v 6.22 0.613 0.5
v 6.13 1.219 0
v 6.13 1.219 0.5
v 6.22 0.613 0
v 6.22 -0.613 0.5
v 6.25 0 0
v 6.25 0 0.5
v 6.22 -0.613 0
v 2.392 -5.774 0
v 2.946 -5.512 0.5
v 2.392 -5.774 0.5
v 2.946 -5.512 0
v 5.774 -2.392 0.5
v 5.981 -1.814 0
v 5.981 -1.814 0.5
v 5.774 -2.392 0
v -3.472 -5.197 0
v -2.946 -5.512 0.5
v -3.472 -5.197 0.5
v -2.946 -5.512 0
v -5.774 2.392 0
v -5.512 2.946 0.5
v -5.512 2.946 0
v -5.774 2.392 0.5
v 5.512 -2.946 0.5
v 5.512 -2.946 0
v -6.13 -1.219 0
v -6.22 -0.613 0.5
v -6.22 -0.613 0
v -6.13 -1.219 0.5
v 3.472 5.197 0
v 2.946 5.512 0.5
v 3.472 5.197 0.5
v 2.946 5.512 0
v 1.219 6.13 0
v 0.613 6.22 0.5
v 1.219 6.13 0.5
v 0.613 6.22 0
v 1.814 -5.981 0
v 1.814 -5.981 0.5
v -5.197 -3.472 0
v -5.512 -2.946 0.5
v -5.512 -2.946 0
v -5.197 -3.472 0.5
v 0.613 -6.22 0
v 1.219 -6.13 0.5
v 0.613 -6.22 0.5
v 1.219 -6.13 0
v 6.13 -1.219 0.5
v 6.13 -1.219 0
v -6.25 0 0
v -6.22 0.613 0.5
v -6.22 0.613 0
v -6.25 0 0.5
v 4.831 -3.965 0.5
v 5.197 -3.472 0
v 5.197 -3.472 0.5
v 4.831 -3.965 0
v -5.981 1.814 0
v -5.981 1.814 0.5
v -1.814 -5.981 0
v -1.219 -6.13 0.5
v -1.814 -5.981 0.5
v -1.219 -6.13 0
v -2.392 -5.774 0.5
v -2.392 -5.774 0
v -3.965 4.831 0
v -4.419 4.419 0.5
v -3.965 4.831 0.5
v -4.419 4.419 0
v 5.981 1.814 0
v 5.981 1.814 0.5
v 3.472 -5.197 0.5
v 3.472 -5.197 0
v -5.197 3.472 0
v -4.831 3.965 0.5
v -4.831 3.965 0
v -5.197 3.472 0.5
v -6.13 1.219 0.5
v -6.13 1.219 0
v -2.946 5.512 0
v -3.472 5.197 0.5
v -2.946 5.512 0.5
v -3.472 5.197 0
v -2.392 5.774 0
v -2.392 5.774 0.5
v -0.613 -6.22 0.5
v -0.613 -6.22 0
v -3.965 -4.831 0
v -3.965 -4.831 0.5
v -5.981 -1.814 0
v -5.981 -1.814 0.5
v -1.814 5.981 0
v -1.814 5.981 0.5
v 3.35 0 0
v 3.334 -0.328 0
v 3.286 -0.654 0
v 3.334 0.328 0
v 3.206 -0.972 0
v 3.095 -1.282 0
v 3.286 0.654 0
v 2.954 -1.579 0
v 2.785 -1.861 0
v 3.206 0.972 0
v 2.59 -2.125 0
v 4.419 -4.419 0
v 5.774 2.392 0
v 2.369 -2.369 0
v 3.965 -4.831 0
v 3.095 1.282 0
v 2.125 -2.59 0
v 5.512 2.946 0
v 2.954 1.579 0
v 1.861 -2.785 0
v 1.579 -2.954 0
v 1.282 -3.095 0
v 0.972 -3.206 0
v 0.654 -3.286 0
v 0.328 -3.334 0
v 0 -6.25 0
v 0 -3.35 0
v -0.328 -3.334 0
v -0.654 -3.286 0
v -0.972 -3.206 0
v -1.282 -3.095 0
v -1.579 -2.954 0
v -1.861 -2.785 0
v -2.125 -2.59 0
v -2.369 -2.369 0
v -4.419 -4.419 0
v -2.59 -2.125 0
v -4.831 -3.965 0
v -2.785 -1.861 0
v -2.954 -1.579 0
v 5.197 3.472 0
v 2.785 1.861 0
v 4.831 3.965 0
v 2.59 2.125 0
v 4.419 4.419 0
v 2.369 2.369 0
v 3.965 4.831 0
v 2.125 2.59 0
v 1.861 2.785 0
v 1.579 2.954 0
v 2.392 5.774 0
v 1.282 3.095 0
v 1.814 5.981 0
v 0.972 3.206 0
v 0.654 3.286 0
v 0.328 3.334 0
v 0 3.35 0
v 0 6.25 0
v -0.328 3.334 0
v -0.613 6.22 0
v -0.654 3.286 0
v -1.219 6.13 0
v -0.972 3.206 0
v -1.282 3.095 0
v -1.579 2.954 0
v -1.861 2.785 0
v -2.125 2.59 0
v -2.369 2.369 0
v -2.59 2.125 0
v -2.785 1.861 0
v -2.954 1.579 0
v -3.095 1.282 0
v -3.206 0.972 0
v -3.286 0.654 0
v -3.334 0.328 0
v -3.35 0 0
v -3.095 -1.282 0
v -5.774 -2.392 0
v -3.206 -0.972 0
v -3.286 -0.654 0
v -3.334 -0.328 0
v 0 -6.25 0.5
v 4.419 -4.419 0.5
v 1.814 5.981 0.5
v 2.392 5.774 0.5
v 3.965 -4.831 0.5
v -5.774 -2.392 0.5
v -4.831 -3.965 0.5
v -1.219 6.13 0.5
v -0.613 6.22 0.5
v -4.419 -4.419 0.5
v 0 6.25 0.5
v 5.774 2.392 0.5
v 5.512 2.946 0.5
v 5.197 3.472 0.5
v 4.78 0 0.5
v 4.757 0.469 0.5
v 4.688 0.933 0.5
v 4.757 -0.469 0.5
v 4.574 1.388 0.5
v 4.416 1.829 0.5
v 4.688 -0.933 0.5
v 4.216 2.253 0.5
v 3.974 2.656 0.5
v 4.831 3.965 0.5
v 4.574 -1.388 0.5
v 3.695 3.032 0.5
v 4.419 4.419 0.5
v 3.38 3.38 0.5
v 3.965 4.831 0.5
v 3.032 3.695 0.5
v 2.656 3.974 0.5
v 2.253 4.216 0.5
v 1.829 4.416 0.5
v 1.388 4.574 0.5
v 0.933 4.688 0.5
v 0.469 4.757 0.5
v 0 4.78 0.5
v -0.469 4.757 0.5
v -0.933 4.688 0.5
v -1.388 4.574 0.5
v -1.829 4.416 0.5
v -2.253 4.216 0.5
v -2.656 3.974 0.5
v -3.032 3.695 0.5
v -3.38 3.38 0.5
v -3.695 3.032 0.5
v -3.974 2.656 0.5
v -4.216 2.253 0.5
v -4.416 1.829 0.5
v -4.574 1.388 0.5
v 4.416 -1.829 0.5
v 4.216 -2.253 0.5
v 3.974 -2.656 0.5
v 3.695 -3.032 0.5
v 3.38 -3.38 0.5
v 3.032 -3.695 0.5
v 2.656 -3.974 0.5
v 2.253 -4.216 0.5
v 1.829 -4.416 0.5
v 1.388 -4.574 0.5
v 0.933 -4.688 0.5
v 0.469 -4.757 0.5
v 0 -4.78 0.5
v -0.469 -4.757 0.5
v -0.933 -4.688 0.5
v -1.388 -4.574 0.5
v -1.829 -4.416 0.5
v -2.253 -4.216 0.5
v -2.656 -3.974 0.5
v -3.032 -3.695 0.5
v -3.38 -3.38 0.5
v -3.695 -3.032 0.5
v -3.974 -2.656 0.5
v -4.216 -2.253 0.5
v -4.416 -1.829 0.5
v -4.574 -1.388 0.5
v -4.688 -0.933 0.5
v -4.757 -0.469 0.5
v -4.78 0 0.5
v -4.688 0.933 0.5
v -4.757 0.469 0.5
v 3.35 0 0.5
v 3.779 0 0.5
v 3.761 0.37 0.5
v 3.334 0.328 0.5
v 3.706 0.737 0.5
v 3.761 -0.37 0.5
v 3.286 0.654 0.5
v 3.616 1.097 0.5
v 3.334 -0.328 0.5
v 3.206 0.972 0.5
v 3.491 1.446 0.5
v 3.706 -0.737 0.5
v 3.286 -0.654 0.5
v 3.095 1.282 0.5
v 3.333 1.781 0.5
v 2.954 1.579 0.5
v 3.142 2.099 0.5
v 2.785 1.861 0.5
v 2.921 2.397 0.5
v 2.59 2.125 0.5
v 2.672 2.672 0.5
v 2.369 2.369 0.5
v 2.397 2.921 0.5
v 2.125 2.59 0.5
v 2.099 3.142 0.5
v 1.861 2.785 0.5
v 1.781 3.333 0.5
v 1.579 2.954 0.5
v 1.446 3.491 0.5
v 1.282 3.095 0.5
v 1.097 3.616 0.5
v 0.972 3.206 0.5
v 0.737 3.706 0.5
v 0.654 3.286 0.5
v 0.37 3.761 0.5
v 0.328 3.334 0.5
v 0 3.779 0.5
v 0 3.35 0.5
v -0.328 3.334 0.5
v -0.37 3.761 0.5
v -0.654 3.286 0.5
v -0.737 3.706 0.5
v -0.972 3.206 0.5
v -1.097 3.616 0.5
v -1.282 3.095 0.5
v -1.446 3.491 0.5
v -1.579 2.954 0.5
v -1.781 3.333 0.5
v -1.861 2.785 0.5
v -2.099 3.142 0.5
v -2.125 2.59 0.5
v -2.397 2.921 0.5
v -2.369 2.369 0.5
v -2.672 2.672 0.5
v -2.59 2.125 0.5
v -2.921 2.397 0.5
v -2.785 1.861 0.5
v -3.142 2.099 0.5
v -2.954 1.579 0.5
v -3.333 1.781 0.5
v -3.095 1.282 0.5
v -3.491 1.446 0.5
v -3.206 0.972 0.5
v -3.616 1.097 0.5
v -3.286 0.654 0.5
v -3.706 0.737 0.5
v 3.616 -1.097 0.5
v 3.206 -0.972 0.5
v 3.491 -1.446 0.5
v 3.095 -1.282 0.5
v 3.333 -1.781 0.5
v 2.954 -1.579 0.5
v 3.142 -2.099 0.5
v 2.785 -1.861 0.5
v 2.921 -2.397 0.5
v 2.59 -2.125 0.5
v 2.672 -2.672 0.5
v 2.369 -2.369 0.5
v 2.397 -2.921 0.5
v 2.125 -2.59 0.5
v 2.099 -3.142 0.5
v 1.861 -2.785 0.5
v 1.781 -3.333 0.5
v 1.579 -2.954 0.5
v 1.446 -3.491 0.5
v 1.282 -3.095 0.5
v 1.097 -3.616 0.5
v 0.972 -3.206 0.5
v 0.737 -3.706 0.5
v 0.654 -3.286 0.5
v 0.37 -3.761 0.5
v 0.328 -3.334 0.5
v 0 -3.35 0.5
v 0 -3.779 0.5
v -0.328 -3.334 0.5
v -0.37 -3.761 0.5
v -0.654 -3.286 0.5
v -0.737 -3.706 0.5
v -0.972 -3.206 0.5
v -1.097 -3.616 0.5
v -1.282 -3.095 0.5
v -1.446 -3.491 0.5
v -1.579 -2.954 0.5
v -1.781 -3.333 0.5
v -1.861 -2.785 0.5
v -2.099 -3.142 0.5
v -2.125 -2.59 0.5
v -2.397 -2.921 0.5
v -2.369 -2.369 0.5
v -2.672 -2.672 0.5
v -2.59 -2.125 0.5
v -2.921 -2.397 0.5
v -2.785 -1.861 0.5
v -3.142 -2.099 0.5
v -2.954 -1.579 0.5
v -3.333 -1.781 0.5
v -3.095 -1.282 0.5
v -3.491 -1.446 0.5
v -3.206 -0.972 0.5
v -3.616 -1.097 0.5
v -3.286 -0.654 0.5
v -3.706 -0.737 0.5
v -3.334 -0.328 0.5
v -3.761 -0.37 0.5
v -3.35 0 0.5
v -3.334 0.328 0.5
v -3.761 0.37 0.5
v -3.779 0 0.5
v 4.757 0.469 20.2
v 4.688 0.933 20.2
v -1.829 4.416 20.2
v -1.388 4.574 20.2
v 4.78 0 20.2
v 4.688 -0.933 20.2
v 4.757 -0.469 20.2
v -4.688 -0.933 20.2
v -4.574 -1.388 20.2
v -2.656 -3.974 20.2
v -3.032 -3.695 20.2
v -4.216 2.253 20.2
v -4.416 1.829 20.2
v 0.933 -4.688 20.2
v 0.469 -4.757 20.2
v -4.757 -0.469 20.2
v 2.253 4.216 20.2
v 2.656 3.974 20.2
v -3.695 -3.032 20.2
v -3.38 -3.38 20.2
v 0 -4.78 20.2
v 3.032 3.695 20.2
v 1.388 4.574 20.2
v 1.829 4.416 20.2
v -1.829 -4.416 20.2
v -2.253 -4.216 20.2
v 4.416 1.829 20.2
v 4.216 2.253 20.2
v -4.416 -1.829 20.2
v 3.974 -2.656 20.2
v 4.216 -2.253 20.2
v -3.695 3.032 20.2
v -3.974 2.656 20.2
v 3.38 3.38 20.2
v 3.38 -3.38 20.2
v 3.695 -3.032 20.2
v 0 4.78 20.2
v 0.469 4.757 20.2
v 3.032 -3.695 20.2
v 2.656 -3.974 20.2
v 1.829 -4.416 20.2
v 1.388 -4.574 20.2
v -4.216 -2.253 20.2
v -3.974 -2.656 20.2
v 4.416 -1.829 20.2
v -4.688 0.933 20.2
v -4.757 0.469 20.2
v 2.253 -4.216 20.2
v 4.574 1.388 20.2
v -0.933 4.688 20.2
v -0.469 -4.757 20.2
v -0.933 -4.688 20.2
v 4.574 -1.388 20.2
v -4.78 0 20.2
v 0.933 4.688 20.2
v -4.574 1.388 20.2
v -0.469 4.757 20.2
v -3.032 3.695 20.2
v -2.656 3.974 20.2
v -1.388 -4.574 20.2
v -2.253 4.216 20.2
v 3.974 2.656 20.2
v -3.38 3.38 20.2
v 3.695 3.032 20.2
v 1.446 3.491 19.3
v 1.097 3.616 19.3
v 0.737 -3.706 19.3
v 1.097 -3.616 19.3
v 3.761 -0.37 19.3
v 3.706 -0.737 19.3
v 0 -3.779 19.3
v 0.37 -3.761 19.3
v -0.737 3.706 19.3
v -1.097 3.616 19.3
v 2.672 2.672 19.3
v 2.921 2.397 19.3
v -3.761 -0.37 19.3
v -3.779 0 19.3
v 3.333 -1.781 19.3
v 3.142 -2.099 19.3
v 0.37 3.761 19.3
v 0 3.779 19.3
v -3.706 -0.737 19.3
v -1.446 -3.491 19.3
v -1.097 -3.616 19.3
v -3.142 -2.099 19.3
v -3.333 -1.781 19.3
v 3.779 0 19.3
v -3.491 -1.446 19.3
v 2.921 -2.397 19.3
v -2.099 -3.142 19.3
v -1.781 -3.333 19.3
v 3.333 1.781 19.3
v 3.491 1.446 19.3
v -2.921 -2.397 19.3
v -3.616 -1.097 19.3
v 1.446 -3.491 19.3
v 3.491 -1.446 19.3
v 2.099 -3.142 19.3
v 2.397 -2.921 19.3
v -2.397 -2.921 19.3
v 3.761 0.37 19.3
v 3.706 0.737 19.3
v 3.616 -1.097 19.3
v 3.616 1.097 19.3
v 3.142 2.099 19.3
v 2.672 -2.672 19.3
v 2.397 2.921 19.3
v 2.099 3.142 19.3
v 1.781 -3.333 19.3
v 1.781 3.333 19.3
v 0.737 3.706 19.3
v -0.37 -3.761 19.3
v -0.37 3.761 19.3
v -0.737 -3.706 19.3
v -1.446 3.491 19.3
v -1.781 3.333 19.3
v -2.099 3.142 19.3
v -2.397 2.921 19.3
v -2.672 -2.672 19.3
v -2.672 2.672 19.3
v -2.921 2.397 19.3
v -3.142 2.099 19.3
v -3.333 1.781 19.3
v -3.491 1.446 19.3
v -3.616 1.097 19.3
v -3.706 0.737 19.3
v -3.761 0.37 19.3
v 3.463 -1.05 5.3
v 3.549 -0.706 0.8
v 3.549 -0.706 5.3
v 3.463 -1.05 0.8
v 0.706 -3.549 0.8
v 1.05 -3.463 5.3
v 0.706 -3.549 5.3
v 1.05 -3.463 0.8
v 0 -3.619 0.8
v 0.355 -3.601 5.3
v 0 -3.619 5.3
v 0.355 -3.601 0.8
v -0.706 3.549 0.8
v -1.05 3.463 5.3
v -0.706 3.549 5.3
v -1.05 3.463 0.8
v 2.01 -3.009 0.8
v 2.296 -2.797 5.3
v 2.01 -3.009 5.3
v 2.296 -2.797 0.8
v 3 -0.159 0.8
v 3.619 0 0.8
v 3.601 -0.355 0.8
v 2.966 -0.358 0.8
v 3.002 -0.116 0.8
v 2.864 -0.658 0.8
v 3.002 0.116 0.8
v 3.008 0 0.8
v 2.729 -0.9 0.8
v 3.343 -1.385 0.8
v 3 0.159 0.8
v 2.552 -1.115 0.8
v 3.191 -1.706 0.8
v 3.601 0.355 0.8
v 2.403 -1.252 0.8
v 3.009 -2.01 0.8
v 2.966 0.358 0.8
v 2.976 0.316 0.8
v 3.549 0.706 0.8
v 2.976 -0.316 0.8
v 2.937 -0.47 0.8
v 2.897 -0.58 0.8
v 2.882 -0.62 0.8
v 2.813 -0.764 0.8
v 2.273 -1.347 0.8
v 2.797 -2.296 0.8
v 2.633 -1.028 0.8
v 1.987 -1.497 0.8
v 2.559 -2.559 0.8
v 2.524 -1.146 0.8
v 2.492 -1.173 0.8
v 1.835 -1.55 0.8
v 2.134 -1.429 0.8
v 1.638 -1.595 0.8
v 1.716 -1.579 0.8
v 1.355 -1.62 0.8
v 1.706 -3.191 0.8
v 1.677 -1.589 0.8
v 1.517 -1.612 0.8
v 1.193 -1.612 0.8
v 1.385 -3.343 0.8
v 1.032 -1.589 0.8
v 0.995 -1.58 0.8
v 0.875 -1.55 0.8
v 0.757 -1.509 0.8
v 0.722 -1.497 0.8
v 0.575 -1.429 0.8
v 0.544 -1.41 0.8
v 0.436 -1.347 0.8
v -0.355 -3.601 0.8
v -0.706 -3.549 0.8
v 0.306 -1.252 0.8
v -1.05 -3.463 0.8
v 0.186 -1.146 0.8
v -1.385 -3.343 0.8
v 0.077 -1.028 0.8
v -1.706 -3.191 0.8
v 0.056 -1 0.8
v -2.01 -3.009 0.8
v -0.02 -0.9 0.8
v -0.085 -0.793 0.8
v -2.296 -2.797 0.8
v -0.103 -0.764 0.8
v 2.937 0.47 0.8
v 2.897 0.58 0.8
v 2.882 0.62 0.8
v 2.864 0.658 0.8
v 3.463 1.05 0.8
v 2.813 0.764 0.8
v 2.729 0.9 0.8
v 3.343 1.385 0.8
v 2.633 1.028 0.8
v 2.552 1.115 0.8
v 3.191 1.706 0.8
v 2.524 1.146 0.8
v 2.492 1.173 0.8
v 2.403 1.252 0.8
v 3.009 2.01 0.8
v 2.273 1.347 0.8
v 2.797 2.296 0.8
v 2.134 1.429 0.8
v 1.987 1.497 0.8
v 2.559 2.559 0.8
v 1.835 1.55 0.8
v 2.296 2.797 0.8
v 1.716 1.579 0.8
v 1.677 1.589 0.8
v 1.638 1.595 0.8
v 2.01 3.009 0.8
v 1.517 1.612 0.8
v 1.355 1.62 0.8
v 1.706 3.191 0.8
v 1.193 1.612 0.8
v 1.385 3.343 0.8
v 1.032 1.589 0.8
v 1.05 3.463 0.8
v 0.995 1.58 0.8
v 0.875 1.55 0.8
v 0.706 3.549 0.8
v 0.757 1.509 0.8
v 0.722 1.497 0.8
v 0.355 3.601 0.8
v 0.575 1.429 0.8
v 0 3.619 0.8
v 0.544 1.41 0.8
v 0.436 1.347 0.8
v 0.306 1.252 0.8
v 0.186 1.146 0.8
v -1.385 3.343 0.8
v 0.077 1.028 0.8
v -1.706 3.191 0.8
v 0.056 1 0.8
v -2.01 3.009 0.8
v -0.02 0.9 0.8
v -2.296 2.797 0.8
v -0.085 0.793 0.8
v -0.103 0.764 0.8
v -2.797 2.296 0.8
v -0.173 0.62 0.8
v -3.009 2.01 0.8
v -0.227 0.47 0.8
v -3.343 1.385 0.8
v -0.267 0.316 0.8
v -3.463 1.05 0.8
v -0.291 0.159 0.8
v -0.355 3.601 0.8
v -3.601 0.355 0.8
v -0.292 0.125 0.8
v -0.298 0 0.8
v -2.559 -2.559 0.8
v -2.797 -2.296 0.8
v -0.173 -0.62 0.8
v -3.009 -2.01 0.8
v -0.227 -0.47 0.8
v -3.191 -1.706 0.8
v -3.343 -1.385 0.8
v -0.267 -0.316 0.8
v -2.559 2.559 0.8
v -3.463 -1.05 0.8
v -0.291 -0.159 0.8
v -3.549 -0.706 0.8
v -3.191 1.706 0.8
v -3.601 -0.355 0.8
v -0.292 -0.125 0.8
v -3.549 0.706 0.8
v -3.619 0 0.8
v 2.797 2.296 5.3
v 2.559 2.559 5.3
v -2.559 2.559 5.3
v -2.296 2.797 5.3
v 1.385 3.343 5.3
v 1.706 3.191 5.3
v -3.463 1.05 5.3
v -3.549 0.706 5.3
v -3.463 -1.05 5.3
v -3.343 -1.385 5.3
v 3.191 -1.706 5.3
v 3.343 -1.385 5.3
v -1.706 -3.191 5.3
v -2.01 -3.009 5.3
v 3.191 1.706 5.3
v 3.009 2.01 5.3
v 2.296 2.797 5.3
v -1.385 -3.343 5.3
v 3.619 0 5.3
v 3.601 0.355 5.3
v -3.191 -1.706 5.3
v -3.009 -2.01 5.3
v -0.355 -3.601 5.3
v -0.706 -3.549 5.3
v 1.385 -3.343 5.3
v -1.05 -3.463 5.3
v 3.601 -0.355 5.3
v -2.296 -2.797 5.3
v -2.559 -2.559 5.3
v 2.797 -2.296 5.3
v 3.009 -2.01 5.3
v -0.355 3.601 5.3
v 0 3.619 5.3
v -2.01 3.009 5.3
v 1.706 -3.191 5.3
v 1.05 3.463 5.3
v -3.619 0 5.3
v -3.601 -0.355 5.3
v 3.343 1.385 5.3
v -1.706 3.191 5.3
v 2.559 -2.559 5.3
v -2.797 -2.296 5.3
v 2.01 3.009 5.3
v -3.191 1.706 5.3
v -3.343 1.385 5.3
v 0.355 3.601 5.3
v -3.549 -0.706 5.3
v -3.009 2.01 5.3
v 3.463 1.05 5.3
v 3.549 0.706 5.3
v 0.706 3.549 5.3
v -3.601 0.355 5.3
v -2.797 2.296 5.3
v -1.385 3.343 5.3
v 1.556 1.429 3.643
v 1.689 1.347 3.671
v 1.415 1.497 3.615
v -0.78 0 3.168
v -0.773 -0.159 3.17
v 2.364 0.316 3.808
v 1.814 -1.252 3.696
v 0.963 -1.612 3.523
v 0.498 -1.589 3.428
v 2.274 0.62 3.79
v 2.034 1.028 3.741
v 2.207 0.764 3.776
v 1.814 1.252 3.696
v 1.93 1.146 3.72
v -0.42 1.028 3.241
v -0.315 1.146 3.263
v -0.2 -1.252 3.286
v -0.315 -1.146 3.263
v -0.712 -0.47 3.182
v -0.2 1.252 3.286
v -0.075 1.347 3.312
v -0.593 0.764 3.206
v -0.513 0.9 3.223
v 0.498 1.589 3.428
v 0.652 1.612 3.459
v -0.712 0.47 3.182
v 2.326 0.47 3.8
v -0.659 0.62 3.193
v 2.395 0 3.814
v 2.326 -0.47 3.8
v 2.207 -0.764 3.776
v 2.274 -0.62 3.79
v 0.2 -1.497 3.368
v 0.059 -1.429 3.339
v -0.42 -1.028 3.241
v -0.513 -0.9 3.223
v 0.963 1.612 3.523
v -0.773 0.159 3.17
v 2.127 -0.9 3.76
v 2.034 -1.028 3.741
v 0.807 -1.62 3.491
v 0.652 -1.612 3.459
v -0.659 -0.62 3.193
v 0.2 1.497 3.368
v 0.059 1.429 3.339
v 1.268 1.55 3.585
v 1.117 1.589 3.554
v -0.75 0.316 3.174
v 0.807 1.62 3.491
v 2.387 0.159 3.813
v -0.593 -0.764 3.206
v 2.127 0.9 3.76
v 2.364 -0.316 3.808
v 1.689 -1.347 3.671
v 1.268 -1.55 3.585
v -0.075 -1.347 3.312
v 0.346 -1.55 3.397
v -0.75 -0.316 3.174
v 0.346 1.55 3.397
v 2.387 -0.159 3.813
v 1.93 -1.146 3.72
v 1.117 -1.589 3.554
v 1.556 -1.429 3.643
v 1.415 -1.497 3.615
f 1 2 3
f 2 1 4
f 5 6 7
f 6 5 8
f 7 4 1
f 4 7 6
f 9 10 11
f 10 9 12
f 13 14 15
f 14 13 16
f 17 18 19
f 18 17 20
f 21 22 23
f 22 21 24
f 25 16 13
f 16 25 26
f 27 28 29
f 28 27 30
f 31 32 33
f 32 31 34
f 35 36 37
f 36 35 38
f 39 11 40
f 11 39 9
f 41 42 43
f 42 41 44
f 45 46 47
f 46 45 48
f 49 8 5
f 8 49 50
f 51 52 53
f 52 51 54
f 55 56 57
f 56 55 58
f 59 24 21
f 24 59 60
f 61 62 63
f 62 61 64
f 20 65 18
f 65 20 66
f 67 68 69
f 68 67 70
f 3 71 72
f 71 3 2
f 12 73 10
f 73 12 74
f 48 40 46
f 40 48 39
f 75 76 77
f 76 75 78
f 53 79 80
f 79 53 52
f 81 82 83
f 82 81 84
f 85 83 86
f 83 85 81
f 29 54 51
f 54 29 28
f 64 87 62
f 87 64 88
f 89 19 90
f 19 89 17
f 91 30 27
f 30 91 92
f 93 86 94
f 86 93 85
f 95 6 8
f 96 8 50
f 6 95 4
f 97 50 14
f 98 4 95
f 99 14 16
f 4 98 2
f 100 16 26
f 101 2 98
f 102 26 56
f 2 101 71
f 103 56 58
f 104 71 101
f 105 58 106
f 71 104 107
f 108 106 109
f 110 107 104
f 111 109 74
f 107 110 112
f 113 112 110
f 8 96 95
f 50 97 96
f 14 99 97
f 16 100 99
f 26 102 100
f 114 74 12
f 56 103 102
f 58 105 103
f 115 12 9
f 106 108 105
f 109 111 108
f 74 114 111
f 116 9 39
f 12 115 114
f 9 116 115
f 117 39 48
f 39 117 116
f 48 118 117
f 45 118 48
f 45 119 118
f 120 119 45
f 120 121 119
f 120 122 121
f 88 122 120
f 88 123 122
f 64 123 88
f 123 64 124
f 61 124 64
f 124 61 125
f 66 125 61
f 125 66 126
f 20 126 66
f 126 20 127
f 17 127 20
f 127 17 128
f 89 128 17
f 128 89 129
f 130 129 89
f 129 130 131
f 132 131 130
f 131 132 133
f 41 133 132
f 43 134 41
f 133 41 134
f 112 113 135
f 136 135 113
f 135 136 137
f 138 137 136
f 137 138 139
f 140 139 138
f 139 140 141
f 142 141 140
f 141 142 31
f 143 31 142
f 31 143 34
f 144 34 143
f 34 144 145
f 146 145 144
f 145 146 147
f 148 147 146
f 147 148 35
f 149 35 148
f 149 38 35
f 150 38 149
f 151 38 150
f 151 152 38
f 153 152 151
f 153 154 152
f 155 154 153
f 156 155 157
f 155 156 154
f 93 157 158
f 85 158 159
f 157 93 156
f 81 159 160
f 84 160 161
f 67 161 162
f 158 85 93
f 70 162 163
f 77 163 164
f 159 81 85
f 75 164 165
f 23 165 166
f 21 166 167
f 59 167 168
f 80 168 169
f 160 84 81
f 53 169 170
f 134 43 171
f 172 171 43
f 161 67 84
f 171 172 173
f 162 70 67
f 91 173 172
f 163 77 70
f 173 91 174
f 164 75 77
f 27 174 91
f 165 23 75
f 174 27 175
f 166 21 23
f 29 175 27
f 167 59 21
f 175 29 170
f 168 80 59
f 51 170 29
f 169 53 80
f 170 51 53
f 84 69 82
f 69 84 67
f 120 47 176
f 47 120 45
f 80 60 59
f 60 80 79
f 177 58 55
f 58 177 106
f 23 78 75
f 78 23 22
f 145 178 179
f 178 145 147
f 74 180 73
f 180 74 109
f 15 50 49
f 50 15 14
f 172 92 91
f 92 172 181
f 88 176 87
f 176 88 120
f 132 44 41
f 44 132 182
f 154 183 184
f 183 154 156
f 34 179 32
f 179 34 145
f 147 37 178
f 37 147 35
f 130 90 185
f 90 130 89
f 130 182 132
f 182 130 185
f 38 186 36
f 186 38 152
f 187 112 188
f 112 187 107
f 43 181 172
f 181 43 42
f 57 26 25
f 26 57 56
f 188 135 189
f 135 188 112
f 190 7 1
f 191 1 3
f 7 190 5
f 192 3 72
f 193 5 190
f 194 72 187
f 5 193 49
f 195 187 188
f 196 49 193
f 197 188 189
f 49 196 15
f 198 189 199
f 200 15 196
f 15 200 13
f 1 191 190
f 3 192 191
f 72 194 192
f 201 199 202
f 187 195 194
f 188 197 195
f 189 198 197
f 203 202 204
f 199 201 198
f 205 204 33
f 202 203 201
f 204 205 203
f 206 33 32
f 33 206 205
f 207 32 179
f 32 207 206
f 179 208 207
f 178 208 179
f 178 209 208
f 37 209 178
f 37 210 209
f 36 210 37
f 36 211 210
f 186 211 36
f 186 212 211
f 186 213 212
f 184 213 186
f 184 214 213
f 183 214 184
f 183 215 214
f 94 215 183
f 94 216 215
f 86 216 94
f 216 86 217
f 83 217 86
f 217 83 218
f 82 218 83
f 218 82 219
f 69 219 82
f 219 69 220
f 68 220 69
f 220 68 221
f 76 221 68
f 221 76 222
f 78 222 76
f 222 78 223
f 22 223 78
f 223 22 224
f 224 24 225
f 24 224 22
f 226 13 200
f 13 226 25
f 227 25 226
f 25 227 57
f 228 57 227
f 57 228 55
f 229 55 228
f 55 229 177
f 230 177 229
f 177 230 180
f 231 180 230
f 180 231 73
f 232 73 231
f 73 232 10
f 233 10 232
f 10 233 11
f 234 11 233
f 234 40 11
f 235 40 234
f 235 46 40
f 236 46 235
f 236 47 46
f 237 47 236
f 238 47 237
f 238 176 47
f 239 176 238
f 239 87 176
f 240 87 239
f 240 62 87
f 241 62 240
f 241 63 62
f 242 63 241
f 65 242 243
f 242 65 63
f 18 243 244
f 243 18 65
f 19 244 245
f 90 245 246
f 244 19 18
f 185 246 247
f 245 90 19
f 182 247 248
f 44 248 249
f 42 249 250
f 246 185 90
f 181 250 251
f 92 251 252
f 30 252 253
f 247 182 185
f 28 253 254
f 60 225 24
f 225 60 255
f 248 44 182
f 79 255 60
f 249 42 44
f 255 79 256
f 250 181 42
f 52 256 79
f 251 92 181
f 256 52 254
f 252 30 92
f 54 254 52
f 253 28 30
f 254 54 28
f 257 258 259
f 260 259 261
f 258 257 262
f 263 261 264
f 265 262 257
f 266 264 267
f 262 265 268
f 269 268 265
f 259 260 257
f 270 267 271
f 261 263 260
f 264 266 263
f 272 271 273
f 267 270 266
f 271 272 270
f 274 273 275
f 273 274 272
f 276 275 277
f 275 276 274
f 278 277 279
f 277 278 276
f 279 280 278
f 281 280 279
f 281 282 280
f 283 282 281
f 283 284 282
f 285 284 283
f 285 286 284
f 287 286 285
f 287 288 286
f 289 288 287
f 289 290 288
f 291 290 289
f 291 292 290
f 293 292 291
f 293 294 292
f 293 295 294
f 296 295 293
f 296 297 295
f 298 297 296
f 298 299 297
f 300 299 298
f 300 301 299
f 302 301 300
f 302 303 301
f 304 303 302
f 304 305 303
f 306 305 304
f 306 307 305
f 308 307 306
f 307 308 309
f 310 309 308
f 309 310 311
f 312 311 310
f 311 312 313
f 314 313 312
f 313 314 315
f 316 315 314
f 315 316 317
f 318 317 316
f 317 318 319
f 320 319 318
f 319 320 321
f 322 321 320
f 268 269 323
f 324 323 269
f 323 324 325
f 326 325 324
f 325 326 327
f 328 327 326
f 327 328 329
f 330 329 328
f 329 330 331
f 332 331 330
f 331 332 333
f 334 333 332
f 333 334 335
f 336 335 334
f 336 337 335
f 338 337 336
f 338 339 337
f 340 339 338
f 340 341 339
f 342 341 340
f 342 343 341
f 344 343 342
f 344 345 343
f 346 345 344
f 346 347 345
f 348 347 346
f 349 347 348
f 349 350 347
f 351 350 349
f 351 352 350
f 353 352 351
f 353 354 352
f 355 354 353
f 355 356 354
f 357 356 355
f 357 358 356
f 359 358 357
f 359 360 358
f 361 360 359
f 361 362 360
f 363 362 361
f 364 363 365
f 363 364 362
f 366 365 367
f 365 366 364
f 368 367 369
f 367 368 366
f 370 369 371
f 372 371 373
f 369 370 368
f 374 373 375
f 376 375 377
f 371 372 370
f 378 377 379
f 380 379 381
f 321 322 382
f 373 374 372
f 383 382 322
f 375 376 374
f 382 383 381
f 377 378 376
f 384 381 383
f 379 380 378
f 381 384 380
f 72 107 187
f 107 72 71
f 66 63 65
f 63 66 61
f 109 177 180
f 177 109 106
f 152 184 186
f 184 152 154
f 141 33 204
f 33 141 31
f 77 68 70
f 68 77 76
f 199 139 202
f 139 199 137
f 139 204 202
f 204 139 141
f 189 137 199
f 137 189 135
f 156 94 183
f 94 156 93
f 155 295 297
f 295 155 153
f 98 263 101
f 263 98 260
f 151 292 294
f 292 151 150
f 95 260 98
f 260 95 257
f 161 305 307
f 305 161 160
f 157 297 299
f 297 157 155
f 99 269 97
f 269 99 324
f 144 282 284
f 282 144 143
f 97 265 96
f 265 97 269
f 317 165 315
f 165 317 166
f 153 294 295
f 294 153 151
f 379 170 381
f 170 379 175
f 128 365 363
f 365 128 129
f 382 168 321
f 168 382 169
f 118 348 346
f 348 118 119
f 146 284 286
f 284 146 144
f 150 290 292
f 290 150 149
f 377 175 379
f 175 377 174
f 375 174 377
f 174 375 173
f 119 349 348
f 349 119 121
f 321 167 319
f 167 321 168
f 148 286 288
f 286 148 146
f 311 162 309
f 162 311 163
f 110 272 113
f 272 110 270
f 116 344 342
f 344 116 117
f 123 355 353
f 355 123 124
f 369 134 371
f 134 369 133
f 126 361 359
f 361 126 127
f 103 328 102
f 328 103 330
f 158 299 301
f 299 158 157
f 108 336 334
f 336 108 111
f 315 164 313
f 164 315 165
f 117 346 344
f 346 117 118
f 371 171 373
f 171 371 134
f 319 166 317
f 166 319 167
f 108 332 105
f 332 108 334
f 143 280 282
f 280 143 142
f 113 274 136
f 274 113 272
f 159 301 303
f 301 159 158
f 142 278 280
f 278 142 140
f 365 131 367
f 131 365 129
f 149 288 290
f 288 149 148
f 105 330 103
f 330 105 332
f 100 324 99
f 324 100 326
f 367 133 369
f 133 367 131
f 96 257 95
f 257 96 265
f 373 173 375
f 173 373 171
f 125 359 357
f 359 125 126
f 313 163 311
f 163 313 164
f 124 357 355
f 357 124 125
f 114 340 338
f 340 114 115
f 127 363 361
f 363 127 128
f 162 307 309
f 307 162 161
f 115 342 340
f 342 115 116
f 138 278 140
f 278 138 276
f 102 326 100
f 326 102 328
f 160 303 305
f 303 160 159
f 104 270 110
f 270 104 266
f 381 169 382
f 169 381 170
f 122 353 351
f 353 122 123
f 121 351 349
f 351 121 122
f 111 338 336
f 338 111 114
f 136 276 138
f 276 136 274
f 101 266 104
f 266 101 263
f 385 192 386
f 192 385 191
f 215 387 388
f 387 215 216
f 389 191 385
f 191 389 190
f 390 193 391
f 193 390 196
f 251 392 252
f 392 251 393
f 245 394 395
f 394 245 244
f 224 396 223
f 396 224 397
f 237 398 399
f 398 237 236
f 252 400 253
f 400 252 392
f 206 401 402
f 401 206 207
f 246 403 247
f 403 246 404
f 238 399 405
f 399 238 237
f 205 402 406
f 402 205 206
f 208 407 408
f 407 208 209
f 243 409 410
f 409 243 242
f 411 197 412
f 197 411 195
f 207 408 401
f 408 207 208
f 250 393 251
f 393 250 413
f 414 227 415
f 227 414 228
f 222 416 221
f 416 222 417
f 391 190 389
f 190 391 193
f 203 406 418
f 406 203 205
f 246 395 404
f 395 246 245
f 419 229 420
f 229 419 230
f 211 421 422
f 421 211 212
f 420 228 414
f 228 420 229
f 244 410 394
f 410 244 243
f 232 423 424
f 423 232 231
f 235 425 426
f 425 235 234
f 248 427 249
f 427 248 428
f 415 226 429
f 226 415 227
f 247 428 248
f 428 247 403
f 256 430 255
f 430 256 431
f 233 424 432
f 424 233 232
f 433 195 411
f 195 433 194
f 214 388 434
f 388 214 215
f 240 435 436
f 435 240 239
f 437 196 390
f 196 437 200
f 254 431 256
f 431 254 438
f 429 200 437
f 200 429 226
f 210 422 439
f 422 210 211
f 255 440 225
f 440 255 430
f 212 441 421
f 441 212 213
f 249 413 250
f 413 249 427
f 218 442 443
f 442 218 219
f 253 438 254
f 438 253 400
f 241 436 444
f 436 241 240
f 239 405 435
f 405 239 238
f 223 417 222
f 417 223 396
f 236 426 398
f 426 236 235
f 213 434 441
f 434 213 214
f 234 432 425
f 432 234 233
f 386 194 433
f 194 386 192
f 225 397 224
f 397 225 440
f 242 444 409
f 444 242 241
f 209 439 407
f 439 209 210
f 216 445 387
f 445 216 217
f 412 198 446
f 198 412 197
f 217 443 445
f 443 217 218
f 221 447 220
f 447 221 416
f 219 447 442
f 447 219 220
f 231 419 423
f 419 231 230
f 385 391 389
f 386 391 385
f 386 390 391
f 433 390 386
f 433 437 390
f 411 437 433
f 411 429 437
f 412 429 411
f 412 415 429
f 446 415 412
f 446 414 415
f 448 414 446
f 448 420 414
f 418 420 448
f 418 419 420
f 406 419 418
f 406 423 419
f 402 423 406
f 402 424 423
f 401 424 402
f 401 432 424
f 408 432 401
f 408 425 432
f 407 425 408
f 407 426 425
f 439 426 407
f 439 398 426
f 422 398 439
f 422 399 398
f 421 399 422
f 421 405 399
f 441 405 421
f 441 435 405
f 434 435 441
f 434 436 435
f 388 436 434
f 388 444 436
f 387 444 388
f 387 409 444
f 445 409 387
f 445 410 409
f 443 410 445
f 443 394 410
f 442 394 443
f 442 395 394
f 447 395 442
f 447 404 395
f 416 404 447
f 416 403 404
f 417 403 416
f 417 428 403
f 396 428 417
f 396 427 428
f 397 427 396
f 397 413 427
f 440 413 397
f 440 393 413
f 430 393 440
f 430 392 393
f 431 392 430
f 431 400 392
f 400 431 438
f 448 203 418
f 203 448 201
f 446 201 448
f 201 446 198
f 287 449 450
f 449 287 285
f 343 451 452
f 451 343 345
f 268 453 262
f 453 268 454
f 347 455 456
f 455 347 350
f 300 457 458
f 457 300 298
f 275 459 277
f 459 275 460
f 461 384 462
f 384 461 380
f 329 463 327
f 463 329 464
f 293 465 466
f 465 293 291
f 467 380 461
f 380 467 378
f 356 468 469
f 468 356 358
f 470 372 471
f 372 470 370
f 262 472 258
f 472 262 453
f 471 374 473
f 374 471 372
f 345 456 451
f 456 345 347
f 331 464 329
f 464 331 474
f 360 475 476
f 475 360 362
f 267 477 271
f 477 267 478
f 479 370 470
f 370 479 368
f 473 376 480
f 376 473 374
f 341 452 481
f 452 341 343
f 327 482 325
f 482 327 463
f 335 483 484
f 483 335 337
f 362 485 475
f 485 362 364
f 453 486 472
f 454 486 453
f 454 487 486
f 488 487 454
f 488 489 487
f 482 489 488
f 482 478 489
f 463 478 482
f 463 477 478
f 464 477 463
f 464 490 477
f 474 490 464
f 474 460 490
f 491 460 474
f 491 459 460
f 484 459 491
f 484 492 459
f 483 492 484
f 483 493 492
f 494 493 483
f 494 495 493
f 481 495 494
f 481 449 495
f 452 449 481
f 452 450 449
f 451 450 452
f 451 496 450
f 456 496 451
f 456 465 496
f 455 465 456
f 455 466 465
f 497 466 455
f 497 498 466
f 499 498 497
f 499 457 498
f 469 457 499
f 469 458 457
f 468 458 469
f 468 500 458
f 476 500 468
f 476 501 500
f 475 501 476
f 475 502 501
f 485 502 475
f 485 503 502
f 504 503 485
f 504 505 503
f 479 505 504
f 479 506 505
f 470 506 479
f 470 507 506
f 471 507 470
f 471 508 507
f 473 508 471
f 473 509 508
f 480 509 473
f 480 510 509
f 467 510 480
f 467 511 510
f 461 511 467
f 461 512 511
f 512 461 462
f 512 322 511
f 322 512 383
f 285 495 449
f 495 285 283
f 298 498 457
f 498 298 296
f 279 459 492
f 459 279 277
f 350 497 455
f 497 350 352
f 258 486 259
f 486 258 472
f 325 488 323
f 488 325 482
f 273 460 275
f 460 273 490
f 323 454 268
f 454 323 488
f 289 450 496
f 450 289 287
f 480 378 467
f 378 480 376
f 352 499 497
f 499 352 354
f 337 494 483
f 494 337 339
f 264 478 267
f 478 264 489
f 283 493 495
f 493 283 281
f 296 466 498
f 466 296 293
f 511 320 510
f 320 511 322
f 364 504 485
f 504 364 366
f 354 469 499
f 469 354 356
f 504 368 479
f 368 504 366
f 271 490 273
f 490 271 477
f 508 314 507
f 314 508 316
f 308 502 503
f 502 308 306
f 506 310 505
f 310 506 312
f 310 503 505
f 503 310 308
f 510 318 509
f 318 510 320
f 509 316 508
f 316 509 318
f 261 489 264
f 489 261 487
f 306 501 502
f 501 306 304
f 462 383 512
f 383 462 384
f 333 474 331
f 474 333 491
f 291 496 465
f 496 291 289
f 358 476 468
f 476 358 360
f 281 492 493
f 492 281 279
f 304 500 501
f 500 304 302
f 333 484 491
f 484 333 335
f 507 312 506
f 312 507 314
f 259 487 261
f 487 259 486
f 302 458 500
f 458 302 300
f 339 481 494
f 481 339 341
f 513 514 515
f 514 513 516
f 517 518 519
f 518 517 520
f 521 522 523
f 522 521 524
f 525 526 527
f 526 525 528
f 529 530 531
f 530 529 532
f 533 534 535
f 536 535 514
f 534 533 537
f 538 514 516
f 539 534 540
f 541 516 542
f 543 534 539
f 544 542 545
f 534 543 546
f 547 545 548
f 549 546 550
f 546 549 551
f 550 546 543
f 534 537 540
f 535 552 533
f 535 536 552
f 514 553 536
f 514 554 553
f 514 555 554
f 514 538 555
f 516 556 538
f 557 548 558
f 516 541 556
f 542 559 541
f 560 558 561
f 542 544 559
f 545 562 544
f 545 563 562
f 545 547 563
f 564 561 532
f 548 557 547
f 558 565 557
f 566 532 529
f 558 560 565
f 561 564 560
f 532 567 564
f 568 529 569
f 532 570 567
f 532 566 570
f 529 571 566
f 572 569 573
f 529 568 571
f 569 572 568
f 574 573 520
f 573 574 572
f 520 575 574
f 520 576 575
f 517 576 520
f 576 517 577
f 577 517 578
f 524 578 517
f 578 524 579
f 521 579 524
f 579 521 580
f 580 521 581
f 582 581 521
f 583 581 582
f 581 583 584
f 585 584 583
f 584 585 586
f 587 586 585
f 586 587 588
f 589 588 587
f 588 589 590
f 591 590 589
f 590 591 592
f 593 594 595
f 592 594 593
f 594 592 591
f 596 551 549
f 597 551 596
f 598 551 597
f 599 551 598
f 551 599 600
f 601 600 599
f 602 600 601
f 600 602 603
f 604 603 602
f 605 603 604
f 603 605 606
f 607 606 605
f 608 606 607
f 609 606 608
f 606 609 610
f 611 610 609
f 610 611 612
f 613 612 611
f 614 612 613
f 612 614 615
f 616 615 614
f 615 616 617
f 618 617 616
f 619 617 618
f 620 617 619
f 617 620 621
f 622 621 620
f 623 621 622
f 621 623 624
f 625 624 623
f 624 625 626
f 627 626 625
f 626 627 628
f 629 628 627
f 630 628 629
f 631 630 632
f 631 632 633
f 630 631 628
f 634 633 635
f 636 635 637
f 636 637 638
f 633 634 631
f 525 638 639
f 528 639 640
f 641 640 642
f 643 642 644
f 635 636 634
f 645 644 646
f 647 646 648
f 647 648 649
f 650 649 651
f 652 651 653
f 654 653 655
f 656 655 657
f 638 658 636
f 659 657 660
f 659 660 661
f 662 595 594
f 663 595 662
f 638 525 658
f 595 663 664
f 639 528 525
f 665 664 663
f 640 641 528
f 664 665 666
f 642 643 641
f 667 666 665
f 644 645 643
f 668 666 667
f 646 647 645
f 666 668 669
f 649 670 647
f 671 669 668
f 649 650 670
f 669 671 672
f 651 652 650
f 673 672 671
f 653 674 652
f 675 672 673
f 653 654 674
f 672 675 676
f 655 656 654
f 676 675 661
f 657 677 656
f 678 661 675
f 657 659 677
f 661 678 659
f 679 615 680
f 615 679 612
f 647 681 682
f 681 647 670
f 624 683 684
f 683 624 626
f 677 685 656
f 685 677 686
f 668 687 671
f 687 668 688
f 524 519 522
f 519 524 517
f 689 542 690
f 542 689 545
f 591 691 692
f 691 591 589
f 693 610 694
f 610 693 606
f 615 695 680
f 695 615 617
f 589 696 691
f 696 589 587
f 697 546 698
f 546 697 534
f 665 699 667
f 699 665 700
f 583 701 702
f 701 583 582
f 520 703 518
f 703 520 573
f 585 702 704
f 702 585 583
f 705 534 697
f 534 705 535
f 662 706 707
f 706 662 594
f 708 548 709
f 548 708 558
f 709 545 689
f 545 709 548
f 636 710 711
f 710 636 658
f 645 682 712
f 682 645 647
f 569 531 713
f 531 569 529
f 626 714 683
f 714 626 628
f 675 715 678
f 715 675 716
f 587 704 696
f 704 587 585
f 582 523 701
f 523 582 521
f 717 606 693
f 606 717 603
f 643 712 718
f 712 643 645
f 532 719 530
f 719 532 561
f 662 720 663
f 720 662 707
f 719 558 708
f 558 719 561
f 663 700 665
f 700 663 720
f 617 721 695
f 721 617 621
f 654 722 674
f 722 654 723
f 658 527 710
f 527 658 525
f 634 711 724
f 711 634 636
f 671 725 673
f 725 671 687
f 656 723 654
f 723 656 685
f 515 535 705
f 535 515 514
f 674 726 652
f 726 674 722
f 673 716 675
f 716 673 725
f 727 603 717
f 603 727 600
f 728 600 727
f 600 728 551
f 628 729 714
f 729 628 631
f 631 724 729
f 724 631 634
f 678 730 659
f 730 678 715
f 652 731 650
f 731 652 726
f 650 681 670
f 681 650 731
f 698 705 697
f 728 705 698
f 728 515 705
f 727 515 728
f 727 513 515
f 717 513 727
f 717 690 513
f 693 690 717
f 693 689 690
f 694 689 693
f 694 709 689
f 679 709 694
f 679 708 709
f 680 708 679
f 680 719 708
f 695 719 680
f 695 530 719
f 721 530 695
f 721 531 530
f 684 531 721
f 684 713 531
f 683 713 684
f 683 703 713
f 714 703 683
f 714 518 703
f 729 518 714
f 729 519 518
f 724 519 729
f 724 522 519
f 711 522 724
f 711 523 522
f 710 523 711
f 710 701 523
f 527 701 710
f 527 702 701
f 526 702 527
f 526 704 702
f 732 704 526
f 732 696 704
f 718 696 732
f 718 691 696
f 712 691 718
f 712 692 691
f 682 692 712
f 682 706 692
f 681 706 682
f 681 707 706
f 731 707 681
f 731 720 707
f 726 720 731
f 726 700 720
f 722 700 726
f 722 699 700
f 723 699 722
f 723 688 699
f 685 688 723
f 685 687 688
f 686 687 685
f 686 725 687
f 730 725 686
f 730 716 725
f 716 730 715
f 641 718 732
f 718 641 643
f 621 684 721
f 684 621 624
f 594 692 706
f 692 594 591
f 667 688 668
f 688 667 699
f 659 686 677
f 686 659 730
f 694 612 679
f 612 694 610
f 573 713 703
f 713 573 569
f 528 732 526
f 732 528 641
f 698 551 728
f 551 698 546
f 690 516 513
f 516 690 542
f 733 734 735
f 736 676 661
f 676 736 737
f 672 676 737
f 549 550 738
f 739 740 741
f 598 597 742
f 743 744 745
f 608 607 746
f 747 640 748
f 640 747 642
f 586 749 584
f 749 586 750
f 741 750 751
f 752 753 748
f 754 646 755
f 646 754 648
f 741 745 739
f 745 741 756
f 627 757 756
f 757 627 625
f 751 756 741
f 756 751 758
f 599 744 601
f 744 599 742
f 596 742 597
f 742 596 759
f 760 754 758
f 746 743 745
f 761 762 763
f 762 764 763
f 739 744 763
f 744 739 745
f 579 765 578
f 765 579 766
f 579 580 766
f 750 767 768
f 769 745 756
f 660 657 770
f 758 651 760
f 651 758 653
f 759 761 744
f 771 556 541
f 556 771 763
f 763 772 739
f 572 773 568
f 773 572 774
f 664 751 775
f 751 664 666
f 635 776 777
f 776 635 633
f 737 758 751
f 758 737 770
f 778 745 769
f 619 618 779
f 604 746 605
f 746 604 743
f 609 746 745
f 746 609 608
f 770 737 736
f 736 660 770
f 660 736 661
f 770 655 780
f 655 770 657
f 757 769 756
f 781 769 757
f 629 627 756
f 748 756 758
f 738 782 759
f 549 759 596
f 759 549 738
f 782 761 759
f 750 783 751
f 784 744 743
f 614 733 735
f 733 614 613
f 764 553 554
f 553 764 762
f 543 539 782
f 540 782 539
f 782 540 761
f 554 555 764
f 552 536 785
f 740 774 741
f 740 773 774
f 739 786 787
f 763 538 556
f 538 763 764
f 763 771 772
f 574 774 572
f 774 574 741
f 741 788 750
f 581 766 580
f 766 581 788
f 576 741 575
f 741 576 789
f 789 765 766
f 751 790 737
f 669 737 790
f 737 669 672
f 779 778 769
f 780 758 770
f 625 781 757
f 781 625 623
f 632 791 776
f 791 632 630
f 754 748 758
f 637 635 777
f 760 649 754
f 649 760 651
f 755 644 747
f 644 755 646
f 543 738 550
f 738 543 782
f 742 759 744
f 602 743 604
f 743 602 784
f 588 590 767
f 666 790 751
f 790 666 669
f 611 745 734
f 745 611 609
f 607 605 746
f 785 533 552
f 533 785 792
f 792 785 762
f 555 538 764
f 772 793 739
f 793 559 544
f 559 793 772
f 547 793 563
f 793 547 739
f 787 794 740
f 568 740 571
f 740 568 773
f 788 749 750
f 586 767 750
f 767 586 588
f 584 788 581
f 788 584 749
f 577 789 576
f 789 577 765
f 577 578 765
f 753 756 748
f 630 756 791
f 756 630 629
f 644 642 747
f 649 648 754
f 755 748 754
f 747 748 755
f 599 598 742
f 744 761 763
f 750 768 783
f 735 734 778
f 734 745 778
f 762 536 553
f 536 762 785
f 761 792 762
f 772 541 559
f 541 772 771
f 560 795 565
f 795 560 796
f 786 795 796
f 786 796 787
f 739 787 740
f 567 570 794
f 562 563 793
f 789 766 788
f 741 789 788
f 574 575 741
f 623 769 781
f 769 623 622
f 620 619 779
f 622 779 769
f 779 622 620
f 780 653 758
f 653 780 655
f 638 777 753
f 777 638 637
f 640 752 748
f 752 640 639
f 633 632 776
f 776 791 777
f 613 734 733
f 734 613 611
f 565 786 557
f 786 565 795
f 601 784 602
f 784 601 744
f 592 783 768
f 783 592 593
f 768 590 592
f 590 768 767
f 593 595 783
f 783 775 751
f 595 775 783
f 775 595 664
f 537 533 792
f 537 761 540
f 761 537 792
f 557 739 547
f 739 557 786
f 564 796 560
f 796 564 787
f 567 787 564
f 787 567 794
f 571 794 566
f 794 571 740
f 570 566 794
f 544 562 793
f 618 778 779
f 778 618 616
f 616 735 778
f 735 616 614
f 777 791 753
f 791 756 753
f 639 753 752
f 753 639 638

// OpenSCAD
// 3D Printer Cutter Attachment
// Uses a bearing to venter the cutting tip of the blade
// as the 3D printer moves.

$fn = 64;
blade_len = 11.4; // Base to tip of blade distance
blade_rad = 3.2/2.0; // Radius of cutting blade
blade_angle = 11.5;
blade_holder_lip_len = 0.5;
backstop_len = 1.0; // How much of a backstop the insert
                    // in the bearing has. The blade will
                    // stick out this far:
                    // blade_len - bearing_h + backstop_len

bearing_inner_rad = 9.6/2.0; // Inner circle of bearing
bearing_inner_ring_rad = 12.5/2.0;
bearing_outer_rad = 22.2/2.0; // Outer circle of bearing
bearing_outer_ring_rad = 24.5/2.0;
bearing_outer_ring_h = 1.4;
bearing_h = 7.1;

spring_len = 14.3;
piston_len = 5.0;
cap_len = 2.0;
cylinder_len = spring_len + piston_len;

bearing_block_len = bearing_outer_rad*2.0 + 5.0;
bearing_block_connector_wid = 6.0;

// Ender 3 Pro mounting params
screw_hole_dist=14.4;
screw_hole_dia=3.0;
screw_hole_rad=screw_hole_dia/2;
screw_len = 20;
hotend_vert_dist = 50.0; // (Vertical) Distance from the screwholes to the hotend location
hotend_horiz_dist = 12.0/2.0; // (Horizontal) Distance from screw holes to center of hotend location

gap_size = 0.02;

// The top-down blade
module blade2D() {
    circle(blade_rad+gap_size);
}

// What holds the cutter inside of the bearing
module blade_holder2D() {
    circle(bearing_inner_rad-gap_size);
}

// The block that holds onto the bearing
module bearing_block2D() {
    difference() {
        union() {
        translate([0,bearing_block_len/4.0])
        square([bearing_block_len, bearing_block_len/2.0], center=true);
        circle(bearing_block_len/2.0);
        }
        circle(bearing_outer_rad+gap_size);
    }
}

//bearing_block2D();
//blade_holder2D();

piston_gap_size = 1.1;
module blade_insert3D() {
    difference() {
    translate([0,0,blade_holder_lip_len+0.3])
    linear_extrude(piston_len-blade_holder_lip_len)
    offset(-piston_gap_size-0.06) blade_holder2D();
    #translate([1.8*blade_rad+0.2, 0, -blade_rad*4.8])
    rotate([0,blade_angle,180])
    linear_extrude(blade_len)
    blade2D();
    }
}

//blade_insert3D();

module blade_holder3D() {
    difference() {
    linear_extrude(blade_holder_lip_len)
    circle(bearing_inner_ring_rad);
    linear_extrude(blade_holder_lip_len)
    circle(bearing_inner_rad-(bearing_inner_ring_rad-bearing_inner_rad));
    }
    
    difference() {
    union() {
    translate([0,0,blade_holder_lip_len])
    linear_extrude(cylinder_len+0.4)
    blade_holder2D();
    linear_extrude(blade_holder_lip_len)
    circle(bearing_inner_ring_rad);
    }
    //translate([0,0,blade_holder_lip_len])
    linear_extrude(cylinder_len)
    offset(-1.0) blade_holder2D();
    //translate([1.8*blade_rad+0.2, 0, -blade_rad/4.0])
    //rotate([0,blade_angle,180])
    //linear_extrude(blade_len)
    //blade2D();
    }
    blade_insert3D();
    //translate([0,0,bearing_h-backstop_len])
    //linear_extrude(backstop_len)
    //circle(bearing_inner_rad-gap_size);
}

module screw_holes(extra_wid=0.0, extra_len=0.0) {
    translate([0, screw_len/2, 0])
    rotate([90,0,0]) {
        translate([(screw_hole_dist+extra_wid)/2,0,0])
        cylinder(r=screw_hole_rad, h=screw_len+extra_len);
        translate([-(screw_hole_dist+extra_wid)/2,0,0])
        cylinder(r=screw_hole_rad, h=screw_len+extra_len);
    }
}

module bearing_block3D() {
    linear_extrude(bearing_h-bearing_outer_ring_h)
    bearing_block2D();
}

support_triangle_wid = bearing_block_len/2-(bearing_outer_rad+gap_size);
module support_triangle() {
    rotate([0,-90,0])
    linear_extrude(support_triangle_wid)
    polygon([[0, 0], [0, bearing_block_len/2], [hotend_vert_dist-bearing_h*2+bearing_outer_ring_h, bearing_block_len/2]]);
}

module bearing_block_connector3D() {
    difference() {
    union() {
    translate([0, bearing_block_len/2.0+bearing_block_connector_wid/2, (hotend_vert_dist-bearing_h)/2])
    cube([bearing_block_len, bearing_block_connector_wid, hotend_vert_dist-bearing_h], center=true);
    translate([bearing_block_len/2,0,bearing_h-bearing_outer_ring_h])
    support_triangle();
    translate([-bearing_block_len/2+support_triangle_wid,0,bearing_h-bearing_outer_ring_h])
    support_triangle();
    }
    translate([0, bearing_block_len/2.0+bearing_block_connector_wid/2, hotend_vert_dist-bearing_h-4])
    screw_holes();
    }
}


// TODO: Incorporate spring into blade holder!
//difference() {
blade_holder3D();
//cube(500);
//}
//#cube([9.3, 1.0, 1.0], center=true);
//difference() {
//union() {
//bearing_block3D();
//bearing_block_connector3D();
//}
//translate([0,13,bearing_h/2-screw_hole_rad/2])
//screw_holes(extra_wid=6.0, extra_len=-5.0);
//}
